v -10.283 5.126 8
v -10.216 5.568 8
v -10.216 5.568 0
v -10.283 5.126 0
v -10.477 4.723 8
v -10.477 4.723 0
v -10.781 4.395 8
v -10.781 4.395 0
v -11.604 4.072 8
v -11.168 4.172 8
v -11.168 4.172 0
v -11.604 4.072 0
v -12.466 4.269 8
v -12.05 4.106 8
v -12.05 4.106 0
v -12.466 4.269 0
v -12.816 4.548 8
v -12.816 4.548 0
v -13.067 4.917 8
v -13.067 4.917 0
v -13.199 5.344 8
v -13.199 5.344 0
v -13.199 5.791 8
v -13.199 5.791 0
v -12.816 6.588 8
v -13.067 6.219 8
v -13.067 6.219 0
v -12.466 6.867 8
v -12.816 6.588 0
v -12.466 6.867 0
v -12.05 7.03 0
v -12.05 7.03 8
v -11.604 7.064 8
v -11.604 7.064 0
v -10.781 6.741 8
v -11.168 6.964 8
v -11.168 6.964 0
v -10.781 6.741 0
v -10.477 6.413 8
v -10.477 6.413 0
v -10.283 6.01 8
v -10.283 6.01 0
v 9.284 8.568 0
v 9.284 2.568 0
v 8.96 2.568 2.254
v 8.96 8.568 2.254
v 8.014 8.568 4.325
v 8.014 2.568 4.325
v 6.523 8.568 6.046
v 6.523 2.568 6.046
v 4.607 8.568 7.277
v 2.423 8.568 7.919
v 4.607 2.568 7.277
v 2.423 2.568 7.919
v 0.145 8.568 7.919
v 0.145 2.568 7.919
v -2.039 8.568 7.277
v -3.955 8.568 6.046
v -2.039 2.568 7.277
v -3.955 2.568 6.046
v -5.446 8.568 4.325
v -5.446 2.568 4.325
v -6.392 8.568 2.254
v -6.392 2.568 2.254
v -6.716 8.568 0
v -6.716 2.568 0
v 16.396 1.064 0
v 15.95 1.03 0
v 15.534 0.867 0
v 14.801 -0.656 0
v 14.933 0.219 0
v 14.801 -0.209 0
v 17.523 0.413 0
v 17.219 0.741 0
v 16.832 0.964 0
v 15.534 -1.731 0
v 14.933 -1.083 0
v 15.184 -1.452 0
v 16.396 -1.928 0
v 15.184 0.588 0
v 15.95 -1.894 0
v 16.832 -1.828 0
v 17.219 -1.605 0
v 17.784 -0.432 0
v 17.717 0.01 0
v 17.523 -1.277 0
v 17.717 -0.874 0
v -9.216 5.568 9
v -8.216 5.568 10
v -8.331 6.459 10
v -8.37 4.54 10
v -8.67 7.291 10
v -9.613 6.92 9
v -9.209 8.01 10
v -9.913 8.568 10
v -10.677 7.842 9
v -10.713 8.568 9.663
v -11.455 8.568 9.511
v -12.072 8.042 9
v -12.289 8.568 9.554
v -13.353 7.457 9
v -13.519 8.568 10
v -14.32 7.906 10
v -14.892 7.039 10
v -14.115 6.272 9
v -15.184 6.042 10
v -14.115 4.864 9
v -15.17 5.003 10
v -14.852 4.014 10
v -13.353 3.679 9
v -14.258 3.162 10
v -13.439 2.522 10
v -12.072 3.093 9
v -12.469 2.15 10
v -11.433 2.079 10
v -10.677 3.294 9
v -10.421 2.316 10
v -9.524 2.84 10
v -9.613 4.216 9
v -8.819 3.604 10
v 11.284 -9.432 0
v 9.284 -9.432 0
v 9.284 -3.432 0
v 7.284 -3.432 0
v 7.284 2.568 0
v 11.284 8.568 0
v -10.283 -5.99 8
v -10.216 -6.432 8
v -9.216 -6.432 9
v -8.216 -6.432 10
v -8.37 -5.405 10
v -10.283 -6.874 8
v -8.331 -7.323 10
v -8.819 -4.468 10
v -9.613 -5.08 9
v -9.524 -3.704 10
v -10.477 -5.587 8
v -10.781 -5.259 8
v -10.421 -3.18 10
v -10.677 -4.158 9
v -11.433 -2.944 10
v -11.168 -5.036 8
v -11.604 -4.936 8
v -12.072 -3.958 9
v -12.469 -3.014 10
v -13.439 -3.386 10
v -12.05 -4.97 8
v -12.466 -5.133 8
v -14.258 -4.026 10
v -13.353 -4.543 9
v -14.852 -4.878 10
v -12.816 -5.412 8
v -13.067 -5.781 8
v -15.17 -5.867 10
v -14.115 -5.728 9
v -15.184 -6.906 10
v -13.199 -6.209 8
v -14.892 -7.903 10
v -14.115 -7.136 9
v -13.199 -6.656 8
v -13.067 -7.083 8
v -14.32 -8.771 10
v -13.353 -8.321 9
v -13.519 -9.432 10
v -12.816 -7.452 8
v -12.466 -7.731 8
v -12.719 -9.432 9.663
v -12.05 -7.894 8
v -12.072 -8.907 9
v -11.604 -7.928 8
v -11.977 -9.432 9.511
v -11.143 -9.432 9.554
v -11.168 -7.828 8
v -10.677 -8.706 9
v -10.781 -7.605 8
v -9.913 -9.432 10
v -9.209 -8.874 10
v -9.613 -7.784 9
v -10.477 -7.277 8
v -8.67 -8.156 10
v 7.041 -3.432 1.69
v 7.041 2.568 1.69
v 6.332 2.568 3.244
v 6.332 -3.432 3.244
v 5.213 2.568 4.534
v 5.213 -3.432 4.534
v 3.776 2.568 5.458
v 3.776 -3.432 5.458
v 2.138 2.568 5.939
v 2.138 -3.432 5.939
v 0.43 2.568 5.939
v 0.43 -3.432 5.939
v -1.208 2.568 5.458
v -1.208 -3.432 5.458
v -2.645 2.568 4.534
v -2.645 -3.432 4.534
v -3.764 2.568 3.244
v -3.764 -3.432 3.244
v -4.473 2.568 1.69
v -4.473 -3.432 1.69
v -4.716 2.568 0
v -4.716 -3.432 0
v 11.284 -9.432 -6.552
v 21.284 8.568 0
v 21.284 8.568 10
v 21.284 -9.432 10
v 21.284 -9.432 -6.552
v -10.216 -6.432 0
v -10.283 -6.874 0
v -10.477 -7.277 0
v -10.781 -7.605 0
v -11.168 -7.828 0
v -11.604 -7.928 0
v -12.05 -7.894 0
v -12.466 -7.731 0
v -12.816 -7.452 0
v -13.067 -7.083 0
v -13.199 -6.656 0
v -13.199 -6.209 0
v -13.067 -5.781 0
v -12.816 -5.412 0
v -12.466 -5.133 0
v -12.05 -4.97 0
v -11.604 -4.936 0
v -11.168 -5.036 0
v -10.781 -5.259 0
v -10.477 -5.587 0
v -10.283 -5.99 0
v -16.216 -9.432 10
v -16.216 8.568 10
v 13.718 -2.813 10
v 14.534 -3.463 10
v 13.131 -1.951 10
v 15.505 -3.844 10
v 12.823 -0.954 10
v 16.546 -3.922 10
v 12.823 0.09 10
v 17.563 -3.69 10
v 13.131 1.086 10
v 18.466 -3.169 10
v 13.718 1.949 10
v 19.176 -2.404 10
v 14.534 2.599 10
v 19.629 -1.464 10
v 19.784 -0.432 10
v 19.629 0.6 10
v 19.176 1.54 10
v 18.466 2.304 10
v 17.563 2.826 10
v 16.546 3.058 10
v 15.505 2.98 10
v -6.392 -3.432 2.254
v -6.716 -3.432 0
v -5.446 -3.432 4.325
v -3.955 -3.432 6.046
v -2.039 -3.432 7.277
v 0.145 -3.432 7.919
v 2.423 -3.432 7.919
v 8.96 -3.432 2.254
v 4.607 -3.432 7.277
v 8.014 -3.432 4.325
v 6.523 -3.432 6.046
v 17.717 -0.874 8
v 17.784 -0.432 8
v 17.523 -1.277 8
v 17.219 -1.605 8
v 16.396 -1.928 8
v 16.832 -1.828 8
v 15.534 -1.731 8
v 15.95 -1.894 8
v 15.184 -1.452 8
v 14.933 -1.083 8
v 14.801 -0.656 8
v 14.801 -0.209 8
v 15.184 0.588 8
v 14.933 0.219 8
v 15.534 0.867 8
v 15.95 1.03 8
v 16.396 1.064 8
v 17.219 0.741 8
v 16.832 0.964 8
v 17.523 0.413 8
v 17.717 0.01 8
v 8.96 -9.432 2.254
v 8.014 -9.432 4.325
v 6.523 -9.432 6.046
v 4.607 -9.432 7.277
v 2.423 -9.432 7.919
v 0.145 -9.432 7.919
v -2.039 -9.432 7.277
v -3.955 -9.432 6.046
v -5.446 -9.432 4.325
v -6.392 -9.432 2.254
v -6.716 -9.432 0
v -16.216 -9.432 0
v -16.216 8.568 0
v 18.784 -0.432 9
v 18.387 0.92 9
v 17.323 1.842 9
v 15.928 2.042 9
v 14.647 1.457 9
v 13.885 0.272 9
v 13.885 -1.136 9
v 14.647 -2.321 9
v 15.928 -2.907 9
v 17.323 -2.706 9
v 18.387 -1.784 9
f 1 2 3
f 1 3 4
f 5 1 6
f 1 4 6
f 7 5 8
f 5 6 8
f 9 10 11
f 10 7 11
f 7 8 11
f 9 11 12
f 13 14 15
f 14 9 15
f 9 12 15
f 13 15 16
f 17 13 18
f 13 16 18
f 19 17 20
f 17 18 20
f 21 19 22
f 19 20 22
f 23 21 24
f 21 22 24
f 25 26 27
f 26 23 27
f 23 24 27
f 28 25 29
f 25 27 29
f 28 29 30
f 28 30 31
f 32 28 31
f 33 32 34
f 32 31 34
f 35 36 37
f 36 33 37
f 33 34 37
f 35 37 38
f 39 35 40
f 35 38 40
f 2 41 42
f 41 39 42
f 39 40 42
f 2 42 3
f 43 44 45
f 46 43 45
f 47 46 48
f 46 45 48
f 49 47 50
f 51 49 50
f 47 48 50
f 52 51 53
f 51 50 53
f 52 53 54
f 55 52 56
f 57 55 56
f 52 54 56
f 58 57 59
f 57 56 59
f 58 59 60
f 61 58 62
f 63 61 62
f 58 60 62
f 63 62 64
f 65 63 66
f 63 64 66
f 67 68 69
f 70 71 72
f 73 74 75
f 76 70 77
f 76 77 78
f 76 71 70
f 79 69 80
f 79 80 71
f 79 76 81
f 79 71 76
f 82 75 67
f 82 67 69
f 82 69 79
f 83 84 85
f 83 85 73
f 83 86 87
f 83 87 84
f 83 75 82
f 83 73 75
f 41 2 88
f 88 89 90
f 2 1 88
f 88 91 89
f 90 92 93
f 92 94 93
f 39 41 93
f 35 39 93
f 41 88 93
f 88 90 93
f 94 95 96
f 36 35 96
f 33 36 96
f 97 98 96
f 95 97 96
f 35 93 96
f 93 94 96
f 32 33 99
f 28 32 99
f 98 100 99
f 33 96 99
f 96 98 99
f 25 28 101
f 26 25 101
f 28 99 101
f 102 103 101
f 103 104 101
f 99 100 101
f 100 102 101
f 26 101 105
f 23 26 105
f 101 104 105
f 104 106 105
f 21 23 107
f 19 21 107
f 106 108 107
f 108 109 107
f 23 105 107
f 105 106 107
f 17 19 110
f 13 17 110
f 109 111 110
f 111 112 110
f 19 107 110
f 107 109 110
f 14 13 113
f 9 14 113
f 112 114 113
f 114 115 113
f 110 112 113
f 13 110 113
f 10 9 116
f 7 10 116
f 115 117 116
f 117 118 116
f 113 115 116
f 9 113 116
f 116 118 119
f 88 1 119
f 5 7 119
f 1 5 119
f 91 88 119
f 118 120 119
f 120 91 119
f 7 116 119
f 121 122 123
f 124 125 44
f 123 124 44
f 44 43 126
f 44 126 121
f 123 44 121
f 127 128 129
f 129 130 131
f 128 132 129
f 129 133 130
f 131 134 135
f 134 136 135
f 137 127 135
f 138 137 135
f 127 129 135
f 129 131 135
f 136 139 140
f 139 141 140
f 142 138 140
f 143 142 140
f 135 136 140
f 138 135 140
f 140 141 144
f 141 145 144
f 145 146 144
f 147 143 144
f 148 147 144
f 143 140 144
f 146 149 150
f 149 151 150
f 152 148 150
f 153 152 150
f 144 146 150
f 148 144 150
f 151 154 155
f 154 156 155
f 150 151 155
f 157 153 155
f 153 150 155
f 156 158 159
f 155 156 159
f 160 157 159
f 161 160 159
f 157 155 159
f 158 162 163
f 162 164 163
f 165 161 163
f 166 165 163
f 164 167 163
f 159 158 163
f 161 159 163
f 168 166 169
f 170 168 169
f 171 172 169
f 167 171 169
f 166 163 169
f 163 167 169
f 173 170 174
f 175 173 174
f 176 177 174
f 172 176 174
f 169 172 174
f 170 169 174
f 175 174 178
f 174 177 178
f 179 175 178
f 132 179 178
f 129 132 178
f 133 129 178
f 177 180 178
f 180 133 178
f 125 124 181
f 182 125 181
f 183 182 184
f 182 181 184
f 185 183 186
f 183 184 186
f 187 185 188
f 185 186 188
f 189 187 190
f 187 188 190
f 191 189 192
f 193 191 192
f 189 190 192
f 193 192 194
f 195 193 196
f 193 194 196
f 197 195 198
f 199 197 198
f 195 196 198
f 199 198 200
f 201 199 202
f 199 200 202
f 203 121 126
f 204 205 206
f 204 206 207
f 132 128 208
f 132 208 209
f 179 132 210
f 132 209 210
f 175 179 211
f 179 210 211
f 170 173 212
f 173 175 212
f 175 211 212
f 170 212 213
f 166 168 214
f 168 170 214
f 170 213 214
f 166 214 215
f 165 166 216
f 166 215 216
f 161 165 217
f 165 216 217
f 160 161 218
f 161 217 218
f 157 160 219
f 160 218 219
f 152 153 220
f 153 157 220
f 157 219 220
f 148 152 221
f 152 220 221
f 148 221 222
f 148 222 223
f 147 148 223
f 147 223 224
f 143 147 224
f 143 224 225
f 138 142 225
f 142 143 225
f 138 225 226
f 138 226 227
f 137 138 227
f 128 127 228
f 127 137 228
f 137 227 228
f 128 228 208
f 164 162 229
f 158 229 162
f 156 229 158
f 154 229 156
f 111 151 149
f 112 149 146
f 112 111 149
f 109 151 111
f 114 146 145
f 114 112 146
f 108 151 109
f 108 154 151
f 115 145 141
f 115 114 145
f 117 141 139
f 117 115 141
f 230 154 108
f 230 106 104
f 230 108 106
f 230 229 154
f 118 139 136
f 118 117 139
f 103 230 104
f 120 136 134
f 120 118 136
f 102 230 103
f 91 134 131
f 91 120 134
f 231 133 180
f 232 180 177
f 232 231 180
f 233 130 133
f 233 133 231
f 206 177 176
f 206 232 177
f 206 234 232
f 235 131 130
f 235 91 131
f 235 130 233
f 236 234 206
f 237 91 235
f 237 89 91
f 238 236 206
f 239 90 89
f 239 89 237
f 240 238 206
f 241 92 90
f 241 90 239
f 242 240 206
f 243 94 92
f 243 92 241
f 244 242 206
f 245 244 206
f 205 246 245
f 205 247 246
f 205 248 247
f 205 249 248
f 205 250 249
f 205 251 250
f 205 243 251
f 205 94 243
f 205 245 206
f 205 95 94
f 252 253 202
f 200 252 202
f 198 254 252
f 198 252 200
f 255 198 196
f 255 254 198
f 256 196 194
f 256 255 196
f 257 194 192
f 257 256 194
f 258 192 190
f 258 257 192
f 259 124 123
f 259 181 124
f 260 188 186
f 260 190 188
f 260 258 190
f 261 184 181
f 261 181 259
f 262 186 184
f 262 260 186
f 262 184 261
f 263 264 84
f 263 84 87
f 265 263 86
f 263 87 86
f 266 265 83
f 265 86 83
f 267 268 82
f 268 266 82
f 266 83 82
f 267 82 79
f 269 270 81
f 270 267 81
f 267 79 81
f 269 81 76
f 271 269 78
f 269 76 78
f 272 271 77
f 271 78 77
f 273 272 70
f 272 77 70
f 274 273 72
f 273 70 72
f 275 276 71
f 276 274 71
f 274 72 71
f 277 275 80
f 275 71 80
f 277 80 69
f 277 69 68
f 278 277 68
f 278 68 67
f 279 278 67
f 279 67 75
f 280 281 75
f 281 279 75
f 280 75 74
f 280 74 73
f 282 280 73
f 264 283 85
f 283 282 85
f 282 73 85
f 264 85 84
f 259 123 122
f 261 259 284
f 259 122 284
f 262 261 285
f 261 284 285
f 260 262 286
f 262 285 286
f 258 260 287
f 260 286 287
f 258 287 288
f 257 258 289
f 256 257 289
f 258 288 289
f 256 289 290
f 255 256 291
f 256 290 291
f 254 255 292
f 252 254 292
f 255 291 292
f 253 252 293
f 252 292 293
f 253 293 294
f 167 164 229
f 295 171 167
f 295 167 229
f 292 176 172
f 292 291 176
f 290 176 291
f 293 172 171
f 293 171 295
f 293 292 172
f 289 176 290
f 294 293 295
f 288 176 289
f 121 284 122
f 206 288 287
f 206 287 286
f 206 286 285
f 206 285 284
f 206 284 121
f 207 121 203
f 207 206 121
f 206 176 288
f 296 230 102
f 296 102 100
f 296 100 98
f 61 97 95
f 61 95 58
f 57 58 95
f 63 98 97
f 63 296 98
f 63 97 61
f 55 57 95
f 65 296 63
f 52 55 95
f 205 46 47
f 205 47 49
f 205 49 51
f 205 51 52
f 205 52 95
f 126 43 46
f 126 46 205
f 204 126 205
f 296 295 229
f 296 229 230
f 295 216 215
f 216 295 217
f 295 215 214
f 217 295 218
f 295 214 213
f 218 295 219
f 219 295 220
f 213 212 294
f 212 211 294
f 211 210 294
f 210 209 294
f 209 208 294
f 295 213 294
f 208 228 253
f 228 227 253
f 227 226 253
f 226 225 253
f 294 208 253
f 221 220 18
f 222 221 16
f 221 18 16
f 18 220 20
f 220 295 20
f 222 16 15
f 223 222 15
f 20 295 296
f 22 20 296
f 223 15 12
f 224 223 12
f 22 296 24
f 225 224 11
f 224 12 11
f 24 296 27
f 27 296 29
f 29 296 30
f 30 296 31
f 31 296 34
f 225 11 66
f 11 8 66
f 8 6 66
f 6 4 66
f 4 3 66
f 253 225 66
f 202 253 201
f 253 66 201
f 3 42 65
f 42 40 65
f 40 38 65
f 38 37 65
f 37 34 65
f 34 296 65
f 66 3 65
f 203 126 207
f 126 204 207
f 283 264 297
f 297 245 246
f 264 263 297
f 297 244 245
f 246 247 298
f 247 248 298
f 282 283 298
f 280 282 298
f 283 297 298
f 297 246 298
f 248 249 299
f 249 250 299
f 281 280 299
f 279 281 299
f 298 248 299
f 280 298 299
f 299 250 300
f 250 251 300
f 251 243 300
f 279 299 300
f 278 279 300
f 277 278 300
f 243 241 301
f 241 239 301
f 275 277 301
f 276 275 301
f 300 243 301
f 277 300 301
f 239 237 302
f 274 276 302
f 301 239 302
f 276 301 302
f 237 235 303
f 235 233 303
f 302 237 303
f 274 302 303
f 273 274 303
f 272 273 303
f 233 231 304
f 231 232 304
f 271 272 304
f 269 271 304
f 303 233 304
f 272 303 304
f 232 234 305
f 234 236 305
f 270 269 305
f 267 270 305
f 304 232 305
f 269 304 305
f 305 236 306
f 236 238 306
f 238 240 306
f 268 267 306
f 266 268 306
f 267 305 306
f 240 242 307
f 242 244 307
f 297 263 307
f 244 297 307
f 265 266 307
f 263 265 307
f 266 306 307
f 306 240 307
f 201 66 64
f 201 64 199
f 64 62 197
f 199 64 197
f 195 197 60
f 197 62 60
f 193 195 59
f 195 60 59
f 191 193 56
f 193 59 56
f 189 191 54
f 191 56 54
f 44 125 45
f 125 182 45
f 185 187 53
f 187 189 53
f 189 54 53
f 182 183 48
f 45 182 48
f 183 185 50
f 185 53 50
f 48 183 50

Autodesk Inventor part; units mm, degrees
ref_plane "YZ Plane" through (0, 0, 0) normal (1, 0, 0) x (0, 1, 0)
ref_plane "XZ Plane" through (0, 0, 0) normal (0, 1, 0) x (-1, 0, 0)
ref_plane "XY Plane" through (0, 0, 0) normal (0, 0, 1) x (1, 0, 0)
sketch "Sketch1" plane through (0, 0, 0) normal (0, 0, 1) x (1, 0, 0)
  line L0 (-13.216, 7.0679) -> (17.784, 7.0679) construction
  line L1 (17.784, 7.0679) -> (17.784, -7.9321) construction
  line L2 (17.784, -7.9321) -> (-13.216, -7.9321) construction
  line L3 (-13.216, -7.9321) -> (-13.216, 7.0679) construction
  circle A0 centre (-11.716, 5.5679) radius 1.5
  circle A1 centre (-11.716, -6.4321) radius 1.5
  circle A2 centre (16.284, -0.4321) radius 1.5
  line L4 (-16.216, 8.5679) -> (21.284, 8.5679)
  line L5 (21.284, 8.5679) -> (21.284, -9.4321)
  line L6 (21.284, -9.4321) -> (-16.216, -9.4321)
  line L7 (-16.216, -9.4321) -> (-16.216, 8.5679)
  point P0 (0, 0)
  dimension "d0" = 28
  dimension "d1" = 6
  dimension "d2" = 6
  dimension "d3" = 3
  dimension "d4" = 3
  dimension "d5" = 3
  dimension "d10" = 4.5
  dimension "d11" = 3
  dimension "d13" = 1.5
  dimension "d34" = 5
extrude "Extrusion1" add sketch "Sketch1" along normal blind 10
sketch "Sketch3" plane through (-16.216, -9.4321, 10) normal (0, -1, 0) x (1, 0, 0)
  line L0 (37.5, -10) -> (0, -10) projected
  circle A0 centre (17.5, -10) radius 6 construction
  line L1 (23.5, -10) -> (23.5, -2.9049) construction
  circle A1 centre (17.5, -10) radius 8
  line L2 (0, -10) -> (0, 0) projected
  line L3 (9.5, -10) -> (9.5, -3.6397) construction
  point P0 (27.5, -10)
  point P1 (16.216, -10)
  dimension "d19" = 12
  dimension "d21" = 16
  dimension "d30" = 9.5
extrude "Extrusion3" cut sketch "Sketch3" against normal blind 6
sketch "Sketch4" plane through (-16.216, -3.4321, 10) normal (0, -1, 0) x (1, 0, 0)
  arc A0 (25.5, -10) -> (9.5, -10) centre (17.5, -10) ccw projected
  circle A1 centre (17.5, -10) radius 6
  point P0 (16.216, -10)
  dimension "d24" = 12
extrude "Extrusion4" cut sketch "Sketch4" against normal blind 6
sketch "Sketch5" plane through (-16.216, 2.5679, 10) normal (0, -1, 0) x (1, 0, 0)
  arc A0 (23.5, -10) -> (11.5, -10) centre (17.5, -10) ccw projected
  circle A1 centre (17.5, -10) radius 8
  point P0 (16.216, -10)
  dimension "d27" = 16
extrude "Extrusion5" cut sketch "Sketch5" against normal blind 19.5
sketch "Sketch6" plane through (21.284, -9.4321, 0) normal (1, 0, 0) x (0, 0, -1)
  line L0 (0, 18) -> (0, 0) projected
  line L1 (0, 18) -> (-10, 18) projected
  line L2 (0, 0) -> (-10, 0) projected
  line L3 (0, 18) -> (6.5515, 0)
  line L4 (0, 18) -> (12.9005, 18) construction
  line L5 (0, 0) -> (6.5515, 0)
  point P0 (0, 9.4321)
  dimension "d31" = 70
extrude "Extrusion6" add sketch "Sketch6" against normal blind 10
chamfer "Chamfer1" distance 2 angle 45 3 edges at (-13.216, 5.5679, 10) (-13.216, -6.4321, 10) (14.784, -0.4321, 10)
equation "\"d4\" = d3"
equation "\"d5\" = d3"
properties part number "Lukker" material "PLA Plastic"
